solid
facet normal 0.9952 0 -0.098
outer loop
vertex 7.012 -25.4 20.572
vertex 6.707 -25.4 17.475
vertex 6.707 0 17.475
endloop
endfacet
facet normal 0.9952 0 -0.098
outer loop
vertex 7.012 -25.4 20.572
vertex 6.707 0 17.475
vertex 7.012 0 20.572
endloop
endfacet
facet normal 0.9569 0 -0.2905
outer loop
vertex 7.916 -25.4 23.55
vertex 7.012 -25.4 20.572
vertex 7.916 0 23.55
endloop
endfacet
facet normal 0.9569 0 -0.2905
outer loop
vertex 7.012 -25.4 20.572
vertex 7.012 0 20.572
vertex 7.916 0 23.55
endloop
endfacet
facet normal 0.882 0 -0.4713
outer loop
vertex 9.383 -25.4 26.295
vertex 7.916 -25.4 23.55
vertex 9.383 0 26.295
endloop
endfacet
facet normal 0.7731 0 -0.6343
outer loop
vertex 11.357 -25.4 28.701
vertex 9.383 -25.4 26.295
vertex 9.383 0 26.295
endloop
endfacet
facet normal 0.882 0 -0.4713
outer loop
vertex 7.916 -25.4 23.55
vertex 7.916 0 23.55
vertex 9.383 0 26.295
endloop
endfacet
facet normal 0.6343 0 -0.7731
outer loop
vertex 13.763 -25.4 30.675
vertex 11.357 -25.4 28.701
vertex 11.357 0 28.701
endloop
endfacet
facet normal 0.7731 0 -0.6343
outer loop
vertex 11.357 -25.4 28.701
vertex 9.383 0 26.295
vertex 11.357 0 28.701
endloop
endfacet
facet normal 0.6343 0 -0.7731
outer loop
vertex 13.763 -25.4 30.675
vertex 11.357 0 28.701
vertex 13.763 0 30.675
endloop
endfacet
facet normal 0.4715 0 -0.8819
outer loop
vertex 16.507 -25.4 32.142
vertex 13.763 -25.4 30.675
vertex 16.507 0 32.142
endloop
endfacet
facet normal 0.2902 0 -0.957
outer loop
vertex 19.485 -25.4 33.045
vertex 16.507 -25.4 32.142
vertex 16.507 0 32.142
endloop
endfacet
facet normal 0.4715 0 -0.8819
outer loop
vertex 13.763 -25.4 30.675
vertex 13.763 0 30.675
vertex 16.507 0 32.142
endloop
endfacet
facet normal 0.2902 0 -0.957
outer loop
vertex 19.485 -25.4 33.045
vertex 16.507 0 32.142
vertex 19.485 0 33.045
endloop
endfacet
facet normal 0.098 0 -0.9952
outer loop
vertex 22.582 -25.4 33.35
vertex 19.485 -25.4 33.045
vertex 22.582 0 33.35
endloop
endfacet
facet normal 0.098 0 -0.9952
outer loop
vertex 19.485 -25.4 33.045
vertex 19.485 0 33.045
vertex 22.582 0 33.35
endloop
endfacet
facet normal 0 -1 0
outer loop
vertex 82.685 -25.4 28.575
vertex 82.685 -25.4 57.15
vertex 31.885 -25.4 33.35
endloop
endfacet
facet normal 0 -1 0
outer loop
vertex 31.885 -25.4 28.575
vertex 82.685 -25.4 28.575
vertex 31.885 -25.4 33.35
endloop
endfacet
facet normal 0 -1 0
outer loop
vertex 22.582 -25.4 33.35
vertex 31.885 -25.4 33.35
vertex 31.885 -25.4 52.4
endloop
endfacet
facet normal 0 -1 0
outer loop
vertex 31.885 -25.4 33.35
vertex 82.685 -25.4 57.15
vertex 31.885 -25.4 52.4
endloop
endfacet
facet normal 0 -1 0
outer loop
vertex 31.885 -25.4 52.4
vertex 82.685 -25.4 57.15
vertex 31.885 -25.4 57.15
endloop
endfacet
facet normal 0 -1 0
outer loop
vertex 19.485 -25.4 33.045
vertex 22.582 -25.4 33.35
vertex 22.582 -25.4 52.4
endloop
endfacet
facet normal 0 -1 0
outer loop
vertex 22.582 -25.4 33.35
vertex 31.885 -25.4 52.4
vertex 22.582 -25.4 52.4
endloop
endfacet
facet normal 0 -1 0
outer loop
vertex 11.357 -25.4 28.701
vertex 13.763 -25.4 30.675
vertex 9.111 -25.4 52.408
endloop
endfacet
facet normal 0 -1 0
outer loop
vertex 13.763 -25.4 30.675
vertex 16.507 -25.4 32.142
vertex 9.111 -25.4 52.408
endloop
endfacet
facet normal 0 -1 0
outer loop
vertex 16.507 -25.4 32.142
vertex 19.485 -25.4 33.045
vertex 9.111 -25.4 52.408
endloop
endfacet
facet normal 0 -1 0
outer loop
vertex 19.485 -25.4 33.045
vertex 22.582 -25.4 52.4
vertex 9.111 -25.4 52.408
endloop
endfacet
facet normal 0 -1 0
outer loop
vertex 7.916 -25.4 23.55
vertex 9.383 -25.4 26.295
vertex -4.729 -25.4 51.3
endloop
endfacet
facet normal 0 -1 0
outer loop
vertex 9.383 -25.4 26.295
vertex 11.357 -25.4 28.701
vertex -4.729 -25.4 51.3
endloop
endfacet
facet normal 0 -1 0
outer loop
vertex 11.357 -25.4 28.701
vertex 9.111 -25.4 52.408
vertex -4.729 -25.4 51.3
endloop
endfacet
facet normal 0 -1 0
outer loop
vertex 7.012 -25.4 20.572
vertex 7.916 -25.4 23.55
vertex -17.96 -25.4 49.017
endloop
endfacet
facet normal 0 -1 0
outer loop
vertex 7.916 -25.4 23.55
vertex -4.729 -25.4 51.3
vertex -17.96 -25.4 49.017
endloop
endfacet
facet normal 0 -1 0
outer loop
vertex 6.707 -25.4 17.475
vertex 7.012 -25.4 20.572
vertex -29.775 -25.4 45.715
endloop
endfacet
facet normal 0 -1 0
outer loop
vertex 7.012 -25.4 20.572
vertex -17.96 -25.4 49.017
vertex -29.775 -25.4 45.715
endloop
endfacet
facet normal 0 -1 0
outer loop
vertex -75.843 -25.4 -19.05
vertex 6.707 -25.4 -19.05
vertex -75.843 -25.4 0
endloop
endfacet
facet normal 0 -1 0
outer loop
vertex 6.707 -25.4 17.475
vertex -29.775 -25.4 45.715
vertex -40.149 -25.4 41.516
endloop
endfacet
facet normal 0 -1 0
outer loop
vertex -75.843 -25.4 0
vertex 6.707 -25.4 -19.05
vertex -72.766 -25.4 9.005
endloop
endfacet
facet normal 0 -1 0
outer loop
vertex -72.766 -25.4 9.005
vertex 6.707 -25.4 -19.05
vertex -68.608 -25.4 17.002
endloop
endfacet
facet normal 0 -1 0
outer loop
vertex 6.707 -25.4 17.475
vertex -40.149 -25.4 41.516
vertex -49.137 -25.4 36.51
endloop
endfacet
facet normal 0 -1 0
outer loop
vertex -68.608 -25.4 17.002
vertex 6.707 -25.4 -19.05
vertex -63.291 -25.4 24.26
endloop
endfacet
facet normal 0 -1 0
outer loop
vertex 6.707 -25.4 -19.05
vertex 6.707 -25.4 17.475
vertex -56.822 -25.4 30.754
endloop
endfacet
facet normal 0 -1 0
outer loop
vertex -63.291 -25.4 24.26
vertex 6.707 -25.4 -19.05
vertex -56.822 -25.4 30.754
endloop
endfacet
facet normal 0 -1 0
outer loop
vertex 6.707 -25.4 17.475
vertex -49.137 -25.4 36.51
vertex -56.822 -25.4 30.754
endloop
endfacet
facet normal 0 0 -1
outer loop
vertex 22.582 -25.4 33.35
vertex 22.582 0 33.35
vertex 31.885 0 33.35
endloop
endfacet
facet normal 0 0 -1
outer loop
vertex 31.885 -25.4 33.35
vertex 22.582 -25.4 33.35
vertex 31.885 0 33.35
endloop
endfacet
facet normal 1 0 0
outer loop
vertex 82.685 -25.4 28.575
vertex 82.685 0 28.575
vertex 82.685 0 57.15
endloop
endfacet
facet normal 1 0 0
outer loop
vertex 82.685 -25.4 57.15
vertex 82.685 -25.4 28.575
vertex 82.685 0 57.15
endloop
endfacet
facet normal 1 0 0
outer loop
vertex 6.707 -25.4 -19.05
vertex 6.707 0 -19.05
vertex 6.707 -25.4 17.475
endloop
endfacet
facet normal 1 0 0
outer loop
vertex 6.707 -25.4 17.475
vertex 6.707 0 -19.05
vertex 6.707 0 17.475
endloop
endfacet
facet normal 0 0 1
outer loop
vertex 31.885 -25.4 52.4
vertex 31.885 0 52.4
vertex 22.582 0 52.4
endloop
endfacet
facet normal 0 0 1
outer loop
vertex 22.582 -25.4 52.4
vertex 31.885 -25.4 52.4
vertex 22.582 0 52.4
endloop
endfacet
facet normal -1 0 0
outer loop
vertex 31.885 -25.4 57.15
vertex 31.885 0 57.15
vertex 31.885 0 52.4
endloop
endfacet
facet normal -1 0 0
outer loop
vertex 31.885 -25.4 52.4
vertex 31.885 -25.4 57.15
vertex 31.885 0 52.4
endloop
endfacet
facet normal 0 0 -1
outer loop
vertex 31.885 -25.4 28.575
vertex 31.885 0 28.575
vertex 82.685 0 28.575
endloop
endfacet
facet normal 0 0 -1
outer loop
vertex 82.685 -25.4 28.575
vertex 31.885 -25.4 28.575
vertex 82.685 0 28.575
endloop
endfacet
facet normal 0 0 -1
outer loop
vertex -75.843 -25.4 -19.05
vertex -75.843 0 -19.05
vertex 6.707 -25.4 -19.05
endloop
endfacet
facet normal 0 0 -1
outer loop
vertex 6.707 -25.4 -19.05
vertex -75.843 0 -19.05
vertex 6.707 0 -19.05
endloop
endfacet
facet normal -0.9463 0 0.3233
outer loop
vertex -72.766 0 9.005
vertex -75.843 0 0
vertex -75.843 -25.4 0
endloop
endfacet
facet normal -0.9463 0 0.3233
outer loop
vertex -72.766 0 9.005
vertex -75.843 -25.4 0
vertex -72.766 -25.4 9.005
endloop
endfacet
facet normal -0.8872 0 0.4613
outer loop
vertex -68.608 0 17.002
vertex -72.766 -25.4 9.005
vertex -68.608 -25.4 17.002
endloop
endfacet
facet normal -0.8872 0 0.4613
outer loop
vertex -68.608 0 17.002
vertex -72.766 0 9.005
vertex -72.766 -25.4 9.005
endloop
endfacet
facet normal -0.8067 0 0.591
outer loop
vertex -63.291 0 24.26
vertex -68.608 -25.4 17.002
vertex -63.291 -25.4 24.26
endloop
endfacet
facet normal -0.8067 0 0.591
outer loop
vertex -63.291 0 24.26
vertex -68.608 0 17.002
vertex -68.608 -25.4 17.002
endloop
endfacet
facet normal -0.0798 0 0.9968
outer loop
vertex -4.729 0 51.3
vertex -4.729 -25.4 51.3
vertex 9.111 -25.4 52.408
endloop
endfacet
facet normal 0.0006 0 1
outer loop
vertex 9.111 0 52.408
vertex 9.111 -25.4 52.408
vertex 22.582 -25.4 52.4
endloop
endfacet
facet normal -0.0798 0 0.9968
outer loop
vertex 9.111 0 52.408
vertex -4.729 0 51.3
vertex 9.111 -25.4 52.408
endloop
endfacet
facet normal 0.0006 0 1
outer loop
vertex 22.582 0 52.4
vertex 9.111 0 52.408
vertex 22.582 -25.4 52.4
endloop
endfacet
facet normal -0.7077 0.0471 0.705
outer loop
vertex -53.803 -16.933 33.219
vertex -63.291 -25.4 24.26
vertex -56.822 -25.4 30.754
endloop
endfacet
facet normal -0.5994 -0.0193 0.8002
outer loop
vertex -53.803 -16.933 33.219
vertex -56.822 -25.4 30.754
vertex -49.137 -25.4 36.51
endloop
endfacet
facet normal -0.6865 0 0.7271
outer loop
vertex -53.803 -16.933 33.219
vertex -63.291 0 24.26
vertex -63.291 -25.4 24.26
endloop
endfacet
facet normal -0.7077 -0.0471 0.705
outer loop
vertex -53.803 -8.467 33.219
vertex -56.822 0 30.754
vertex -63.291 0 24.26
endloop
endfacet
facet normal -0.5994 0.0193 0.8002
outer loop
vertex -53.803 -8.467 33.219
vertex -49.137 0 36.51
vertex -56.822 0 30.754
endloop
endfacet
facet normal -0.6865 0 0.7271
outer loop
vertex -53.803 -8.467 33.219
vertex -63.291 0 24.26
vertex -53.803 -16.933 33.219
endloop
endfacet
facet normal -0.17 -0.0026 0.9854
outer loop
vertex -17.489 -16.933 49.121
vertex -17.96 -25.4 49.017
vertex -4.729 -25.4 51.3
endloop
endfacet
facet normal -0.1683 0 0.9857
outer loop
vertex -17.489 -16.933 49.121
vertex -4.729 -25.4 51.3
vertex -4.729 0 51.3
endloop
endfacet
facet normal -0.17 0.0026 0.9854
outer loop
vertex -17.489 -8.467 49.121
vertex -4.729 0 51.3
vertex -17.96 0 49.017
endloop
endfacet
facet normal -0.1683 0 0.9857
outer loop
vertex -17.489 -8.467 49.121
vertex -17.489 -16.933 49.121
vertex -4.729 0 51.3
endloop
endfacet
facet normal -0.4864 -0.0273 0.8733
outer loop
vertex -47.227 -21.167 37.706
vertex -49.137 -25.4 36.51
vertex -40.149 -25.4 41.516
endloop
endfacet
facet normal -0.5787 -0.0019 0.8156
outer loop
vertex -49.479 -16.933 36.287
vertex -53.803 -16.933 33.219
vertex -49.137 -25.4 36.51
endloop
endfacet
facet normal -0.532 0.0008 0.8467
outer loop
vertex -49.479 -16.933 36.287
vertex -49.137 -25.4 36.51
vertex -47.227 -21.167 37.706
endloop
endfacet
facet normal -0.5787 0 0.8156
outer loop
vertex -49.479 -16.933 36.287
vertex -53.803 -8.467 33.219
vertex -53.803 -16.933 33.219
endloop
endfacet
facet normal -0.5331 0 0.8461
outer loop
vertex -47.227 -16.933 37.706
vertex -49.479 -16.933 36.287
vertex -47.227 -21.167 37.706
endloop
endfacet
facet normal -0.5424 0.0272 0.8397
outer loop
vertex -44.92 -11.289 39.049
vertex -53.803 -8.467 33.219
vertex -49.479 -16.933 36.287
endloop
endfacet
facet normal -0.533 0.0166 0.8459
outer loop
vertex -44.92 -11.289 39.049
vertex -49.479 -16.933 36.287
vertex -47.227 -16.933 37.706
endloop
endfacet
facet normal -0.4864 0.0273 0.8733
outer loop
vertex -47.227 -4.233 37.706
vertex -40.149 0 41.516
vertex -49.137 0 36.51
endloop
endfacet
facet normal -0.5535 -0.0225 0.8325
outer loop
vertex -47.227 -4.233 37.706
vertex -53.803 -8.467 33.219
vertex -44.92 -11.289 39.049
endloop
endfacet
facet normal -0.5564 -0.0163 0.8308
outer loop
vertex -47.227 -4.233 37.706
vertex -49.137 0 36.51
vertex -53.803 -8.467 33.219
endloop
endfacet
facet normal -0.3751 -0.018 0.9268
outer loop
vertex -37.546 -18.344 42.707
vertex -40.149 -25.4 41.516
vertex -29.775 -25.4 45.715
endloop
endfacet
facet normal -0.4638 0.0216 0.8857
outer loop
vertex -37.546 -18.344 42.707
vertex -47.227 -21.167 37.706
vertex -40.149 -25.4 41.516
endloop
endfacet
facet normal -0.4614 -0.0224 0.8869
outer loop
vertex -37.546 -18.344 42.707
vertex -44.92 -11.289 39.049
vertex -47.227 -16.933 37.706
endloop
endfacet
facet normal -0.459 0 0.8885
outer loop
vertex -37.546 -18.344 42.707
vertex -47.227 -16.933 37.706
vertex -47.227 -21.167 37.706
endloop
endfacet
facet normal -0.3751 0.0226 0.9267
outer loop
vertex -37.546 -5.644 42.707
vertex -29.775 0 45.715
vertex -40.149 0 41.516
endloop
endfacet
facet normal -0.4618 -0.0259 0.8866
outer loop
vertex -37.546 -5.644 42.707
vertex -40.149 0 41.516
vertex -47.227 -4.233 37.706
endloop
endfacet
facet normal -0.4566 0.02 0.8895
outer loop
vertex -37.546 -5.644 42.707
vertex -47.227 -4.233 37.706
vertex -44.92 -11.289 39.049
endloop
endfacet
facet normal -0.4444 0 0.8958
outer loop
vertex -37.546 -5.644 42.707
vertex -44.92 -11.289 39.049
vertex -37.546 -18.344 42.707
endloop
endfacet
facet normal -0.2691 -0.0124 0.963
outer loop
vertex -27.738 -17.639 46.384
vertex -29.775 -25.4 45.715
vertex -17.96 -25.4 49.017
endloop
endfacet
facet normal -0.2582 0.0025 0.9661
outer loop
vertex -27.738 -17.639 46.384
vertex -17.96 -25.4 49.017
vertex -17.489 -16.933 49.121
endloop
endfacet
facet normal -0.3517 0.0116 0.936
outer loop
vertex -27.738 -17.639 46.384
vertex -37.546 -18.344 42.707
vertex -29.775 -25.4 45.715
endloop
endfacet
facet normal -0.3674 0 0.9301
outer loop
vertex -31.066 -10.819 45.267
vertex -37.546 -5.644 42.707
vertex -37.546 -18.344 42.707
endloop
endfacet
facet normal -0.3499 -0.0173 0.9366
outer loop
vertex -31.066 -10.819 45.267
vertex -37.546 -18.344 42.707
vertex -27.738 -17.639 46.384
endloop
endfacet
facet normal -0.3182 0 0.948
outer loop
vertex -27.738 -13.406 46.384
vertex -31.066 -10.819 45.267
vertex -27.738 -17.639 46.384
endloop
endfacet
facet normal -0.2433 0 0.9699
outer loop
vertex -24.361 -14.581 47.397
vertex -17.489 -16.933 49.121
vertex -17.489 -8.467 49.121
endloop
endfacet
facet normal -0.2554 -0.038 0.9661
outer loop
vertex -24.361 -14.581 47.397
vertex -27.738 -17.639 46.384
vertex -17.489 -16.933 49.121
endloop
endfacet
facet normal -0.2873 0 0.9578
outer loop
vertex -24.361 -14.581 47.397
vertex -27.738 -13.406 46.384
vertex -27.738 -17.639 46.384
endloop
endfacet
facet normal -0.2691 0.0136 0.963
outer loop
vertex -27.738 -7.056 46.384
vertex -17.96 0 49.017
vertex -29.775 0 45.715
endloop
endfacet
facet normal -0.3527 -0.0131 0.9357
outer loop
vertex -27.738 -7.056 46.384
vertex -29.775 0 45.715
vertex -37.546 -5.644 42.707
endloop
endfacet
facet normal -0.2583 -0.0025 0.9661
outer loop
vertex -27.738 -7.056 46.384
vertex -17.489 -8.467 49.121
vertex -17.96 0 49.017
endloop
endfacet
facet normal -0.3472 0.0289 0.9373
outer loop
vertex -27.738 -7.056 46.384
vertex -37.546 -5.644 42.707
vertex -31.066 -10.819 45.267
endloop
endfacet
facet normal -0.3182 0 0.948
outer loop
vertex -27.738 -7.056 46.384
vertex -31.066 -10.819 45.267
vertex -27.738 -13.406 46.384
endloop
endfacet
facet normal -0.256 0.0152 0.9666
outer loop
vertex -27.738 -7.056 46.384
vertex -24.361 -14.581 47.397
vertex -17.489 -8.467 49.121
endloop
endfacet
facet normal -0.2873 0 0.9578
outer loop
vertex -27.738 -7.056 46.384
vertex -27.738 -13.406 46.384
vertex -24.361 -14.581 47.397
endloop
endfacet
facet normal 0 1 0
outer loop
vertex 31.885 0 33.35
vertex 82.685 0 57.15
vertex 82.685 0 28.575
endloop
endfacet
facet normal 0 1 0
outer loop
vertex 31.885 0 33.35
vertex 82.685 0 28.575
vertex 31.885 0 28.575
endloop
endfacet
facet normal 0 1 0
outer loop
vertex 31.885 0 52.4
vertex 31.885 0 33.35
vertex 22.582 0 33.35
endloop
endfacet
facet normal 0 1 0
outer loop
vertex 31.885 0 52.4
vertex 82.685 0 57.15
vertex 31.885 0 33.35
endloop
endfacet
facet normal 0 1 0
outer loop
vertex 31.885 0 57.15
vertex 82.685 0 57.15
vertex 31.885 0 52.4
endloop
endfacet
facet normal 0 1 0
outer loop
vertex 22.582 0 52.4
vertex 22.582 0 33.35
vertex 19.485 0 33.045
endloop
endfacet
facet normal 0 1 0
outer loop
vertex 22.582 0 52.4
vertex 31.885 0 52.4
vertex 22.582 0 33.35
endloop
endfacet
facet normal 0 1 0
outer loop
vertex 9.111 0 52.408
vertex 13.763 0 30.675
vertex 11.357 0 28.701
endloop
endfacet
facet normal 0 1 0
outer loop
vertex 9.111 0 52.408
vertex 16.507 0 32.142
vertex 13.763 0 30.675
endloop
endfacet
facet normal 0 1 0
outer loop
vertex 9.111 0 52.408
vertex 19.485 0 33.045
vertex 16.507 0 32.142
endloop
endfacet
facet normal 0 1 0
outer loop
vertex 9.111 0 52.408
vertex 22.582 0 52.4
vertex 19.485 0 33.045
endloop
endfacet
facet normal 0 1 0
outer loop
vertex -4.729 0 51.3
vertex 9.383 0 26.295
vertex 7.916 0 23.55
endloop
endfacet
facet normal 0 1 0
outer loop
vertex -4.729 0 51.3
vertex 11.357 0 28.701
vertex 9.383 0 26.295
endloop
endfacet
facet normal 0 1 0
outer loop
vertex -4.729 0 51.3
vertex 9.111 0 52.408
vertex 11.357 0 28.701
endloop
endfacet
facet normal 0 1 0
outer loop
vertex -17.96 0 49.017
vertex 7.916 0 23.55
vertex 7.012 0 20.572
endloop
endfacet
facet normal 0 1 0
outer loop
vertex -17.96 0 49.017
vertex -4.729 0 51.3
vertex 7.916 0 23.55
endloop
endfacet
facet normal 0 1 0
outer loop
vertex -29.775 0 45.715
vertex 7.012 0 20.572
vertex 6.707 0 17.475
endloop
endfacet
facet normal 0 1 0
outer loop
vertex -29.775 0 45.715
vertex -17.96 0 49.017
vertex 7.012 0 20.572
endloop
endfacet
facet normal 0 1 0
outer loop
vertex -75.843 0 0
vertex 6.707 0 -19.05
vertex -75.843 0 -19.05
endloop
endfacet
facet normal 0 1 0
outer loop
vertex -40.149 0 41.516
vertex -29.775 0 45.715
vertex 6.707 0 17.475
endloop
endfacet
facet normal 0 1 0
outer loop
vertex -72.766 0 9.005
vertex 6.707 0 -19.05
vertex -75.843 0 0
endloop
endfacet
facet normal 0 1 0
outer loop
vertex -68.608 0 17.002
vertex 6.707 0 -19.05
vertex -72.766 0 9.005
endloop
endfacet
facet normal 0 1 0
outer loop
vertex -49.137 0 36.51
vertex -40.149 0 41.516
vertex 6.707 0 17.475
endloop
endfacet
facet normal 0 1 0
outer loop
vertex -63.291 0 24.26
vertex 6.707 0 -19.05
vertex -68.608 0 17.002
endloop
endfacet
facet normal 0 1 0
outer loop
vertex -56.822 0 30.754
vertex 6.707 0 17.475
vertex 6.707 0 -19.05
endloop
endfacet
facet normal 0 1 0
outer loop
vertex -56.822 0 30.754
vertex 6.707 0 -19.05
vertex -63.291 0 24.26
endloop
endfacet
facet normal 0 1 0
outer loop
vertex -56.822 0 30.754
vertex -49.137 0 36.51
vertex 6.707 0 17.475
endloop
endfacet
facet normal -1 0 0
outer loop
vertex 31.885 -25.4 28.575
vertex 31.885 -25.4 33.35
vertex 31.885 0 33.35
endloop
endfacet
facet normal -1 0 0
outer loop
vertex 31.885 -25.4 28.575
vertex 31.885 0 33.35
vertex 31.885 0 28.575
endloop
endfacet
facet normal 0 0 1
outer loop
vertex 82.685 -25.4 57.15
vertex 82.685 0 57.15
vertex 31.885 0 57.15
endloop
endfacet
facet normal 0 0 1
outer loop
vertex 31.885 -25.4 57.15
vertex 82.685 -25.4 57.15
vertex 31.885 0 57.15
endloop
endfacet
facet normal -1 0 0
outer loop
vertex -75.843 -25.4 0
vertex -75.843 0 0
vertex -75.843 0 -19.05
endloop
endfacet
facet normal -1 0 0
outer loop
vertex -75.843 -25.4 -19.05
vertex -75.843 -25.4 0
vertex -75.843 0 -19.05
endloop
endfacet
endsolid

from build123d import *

# Parameters (mm, degrees)
F0_W     = 25.4
F0_H     = 28.575
F1_DEPTH = 25.4


with BuildPart() as f1:
    # F0 (on Front) → F1 (new body)
    with BuildSketch(Plane.XZ):
        with BuildLine():
            add(Edge.make_bspline(
                [(-75.842815, 0), (-64.44554, 43.440532), (-15.861409, 53.869586), (22.582185, 52.4002)],
                knots=[0, 0, 0, 0, 111.504536, 111.504536, 111.504536, 111.504536], degree=3))
            Line((-75.842815, 0), (-12.342815, 0))
            Line((-12.342815, 0), (-12.342815, 17.4752))
            ThreePointArc((-12.342815, 17.4752), (-2.113519, 42.170904), (22.582185, 52.4002))
        make_face()
        Polygon((-12.342815, 0), (-75.842815, 0), (-75.842815, -19.05), (6.707185, -19.05), (6.707185, 0), align=None)
        with BuildLine():
            Line((-12.342815, 17.4752), (-12.342815, 0))
            Line((-12.342815, 0), (6.707185, 0))
            Line((6.707185, 0), (6.707185, 17.4752))
            ThreePointArc((6.707185, 17.4752), (11.356865, 28.70052), (22.582185, 33.3502))
            Line((22.582185, 33.3502), (31.884942, 33.3502))
            Line((31.884942, 33.3502), (31.884942, 52.4002))
            Line((31.884942, 52.4002), (22.582185, 52.4002))
            ThreePointArc((22.582185, 52.4002), (-2.113519, 42.170904), (-12.342815, 17.4752))
        make_face()
        Polygon((31.884942, 57.15), (31.884942, 52.4002), (31.884942, 33.3502), (31.884942, 28.575), (57.284942, 28.575), (57.284942, 57.15), align=None)
        with Locations((69.984942, 42.8625)):
            Rectangle(F0_W, F0_H)
    extrude(amount=F1_DEPTH)


solid = f1.part
